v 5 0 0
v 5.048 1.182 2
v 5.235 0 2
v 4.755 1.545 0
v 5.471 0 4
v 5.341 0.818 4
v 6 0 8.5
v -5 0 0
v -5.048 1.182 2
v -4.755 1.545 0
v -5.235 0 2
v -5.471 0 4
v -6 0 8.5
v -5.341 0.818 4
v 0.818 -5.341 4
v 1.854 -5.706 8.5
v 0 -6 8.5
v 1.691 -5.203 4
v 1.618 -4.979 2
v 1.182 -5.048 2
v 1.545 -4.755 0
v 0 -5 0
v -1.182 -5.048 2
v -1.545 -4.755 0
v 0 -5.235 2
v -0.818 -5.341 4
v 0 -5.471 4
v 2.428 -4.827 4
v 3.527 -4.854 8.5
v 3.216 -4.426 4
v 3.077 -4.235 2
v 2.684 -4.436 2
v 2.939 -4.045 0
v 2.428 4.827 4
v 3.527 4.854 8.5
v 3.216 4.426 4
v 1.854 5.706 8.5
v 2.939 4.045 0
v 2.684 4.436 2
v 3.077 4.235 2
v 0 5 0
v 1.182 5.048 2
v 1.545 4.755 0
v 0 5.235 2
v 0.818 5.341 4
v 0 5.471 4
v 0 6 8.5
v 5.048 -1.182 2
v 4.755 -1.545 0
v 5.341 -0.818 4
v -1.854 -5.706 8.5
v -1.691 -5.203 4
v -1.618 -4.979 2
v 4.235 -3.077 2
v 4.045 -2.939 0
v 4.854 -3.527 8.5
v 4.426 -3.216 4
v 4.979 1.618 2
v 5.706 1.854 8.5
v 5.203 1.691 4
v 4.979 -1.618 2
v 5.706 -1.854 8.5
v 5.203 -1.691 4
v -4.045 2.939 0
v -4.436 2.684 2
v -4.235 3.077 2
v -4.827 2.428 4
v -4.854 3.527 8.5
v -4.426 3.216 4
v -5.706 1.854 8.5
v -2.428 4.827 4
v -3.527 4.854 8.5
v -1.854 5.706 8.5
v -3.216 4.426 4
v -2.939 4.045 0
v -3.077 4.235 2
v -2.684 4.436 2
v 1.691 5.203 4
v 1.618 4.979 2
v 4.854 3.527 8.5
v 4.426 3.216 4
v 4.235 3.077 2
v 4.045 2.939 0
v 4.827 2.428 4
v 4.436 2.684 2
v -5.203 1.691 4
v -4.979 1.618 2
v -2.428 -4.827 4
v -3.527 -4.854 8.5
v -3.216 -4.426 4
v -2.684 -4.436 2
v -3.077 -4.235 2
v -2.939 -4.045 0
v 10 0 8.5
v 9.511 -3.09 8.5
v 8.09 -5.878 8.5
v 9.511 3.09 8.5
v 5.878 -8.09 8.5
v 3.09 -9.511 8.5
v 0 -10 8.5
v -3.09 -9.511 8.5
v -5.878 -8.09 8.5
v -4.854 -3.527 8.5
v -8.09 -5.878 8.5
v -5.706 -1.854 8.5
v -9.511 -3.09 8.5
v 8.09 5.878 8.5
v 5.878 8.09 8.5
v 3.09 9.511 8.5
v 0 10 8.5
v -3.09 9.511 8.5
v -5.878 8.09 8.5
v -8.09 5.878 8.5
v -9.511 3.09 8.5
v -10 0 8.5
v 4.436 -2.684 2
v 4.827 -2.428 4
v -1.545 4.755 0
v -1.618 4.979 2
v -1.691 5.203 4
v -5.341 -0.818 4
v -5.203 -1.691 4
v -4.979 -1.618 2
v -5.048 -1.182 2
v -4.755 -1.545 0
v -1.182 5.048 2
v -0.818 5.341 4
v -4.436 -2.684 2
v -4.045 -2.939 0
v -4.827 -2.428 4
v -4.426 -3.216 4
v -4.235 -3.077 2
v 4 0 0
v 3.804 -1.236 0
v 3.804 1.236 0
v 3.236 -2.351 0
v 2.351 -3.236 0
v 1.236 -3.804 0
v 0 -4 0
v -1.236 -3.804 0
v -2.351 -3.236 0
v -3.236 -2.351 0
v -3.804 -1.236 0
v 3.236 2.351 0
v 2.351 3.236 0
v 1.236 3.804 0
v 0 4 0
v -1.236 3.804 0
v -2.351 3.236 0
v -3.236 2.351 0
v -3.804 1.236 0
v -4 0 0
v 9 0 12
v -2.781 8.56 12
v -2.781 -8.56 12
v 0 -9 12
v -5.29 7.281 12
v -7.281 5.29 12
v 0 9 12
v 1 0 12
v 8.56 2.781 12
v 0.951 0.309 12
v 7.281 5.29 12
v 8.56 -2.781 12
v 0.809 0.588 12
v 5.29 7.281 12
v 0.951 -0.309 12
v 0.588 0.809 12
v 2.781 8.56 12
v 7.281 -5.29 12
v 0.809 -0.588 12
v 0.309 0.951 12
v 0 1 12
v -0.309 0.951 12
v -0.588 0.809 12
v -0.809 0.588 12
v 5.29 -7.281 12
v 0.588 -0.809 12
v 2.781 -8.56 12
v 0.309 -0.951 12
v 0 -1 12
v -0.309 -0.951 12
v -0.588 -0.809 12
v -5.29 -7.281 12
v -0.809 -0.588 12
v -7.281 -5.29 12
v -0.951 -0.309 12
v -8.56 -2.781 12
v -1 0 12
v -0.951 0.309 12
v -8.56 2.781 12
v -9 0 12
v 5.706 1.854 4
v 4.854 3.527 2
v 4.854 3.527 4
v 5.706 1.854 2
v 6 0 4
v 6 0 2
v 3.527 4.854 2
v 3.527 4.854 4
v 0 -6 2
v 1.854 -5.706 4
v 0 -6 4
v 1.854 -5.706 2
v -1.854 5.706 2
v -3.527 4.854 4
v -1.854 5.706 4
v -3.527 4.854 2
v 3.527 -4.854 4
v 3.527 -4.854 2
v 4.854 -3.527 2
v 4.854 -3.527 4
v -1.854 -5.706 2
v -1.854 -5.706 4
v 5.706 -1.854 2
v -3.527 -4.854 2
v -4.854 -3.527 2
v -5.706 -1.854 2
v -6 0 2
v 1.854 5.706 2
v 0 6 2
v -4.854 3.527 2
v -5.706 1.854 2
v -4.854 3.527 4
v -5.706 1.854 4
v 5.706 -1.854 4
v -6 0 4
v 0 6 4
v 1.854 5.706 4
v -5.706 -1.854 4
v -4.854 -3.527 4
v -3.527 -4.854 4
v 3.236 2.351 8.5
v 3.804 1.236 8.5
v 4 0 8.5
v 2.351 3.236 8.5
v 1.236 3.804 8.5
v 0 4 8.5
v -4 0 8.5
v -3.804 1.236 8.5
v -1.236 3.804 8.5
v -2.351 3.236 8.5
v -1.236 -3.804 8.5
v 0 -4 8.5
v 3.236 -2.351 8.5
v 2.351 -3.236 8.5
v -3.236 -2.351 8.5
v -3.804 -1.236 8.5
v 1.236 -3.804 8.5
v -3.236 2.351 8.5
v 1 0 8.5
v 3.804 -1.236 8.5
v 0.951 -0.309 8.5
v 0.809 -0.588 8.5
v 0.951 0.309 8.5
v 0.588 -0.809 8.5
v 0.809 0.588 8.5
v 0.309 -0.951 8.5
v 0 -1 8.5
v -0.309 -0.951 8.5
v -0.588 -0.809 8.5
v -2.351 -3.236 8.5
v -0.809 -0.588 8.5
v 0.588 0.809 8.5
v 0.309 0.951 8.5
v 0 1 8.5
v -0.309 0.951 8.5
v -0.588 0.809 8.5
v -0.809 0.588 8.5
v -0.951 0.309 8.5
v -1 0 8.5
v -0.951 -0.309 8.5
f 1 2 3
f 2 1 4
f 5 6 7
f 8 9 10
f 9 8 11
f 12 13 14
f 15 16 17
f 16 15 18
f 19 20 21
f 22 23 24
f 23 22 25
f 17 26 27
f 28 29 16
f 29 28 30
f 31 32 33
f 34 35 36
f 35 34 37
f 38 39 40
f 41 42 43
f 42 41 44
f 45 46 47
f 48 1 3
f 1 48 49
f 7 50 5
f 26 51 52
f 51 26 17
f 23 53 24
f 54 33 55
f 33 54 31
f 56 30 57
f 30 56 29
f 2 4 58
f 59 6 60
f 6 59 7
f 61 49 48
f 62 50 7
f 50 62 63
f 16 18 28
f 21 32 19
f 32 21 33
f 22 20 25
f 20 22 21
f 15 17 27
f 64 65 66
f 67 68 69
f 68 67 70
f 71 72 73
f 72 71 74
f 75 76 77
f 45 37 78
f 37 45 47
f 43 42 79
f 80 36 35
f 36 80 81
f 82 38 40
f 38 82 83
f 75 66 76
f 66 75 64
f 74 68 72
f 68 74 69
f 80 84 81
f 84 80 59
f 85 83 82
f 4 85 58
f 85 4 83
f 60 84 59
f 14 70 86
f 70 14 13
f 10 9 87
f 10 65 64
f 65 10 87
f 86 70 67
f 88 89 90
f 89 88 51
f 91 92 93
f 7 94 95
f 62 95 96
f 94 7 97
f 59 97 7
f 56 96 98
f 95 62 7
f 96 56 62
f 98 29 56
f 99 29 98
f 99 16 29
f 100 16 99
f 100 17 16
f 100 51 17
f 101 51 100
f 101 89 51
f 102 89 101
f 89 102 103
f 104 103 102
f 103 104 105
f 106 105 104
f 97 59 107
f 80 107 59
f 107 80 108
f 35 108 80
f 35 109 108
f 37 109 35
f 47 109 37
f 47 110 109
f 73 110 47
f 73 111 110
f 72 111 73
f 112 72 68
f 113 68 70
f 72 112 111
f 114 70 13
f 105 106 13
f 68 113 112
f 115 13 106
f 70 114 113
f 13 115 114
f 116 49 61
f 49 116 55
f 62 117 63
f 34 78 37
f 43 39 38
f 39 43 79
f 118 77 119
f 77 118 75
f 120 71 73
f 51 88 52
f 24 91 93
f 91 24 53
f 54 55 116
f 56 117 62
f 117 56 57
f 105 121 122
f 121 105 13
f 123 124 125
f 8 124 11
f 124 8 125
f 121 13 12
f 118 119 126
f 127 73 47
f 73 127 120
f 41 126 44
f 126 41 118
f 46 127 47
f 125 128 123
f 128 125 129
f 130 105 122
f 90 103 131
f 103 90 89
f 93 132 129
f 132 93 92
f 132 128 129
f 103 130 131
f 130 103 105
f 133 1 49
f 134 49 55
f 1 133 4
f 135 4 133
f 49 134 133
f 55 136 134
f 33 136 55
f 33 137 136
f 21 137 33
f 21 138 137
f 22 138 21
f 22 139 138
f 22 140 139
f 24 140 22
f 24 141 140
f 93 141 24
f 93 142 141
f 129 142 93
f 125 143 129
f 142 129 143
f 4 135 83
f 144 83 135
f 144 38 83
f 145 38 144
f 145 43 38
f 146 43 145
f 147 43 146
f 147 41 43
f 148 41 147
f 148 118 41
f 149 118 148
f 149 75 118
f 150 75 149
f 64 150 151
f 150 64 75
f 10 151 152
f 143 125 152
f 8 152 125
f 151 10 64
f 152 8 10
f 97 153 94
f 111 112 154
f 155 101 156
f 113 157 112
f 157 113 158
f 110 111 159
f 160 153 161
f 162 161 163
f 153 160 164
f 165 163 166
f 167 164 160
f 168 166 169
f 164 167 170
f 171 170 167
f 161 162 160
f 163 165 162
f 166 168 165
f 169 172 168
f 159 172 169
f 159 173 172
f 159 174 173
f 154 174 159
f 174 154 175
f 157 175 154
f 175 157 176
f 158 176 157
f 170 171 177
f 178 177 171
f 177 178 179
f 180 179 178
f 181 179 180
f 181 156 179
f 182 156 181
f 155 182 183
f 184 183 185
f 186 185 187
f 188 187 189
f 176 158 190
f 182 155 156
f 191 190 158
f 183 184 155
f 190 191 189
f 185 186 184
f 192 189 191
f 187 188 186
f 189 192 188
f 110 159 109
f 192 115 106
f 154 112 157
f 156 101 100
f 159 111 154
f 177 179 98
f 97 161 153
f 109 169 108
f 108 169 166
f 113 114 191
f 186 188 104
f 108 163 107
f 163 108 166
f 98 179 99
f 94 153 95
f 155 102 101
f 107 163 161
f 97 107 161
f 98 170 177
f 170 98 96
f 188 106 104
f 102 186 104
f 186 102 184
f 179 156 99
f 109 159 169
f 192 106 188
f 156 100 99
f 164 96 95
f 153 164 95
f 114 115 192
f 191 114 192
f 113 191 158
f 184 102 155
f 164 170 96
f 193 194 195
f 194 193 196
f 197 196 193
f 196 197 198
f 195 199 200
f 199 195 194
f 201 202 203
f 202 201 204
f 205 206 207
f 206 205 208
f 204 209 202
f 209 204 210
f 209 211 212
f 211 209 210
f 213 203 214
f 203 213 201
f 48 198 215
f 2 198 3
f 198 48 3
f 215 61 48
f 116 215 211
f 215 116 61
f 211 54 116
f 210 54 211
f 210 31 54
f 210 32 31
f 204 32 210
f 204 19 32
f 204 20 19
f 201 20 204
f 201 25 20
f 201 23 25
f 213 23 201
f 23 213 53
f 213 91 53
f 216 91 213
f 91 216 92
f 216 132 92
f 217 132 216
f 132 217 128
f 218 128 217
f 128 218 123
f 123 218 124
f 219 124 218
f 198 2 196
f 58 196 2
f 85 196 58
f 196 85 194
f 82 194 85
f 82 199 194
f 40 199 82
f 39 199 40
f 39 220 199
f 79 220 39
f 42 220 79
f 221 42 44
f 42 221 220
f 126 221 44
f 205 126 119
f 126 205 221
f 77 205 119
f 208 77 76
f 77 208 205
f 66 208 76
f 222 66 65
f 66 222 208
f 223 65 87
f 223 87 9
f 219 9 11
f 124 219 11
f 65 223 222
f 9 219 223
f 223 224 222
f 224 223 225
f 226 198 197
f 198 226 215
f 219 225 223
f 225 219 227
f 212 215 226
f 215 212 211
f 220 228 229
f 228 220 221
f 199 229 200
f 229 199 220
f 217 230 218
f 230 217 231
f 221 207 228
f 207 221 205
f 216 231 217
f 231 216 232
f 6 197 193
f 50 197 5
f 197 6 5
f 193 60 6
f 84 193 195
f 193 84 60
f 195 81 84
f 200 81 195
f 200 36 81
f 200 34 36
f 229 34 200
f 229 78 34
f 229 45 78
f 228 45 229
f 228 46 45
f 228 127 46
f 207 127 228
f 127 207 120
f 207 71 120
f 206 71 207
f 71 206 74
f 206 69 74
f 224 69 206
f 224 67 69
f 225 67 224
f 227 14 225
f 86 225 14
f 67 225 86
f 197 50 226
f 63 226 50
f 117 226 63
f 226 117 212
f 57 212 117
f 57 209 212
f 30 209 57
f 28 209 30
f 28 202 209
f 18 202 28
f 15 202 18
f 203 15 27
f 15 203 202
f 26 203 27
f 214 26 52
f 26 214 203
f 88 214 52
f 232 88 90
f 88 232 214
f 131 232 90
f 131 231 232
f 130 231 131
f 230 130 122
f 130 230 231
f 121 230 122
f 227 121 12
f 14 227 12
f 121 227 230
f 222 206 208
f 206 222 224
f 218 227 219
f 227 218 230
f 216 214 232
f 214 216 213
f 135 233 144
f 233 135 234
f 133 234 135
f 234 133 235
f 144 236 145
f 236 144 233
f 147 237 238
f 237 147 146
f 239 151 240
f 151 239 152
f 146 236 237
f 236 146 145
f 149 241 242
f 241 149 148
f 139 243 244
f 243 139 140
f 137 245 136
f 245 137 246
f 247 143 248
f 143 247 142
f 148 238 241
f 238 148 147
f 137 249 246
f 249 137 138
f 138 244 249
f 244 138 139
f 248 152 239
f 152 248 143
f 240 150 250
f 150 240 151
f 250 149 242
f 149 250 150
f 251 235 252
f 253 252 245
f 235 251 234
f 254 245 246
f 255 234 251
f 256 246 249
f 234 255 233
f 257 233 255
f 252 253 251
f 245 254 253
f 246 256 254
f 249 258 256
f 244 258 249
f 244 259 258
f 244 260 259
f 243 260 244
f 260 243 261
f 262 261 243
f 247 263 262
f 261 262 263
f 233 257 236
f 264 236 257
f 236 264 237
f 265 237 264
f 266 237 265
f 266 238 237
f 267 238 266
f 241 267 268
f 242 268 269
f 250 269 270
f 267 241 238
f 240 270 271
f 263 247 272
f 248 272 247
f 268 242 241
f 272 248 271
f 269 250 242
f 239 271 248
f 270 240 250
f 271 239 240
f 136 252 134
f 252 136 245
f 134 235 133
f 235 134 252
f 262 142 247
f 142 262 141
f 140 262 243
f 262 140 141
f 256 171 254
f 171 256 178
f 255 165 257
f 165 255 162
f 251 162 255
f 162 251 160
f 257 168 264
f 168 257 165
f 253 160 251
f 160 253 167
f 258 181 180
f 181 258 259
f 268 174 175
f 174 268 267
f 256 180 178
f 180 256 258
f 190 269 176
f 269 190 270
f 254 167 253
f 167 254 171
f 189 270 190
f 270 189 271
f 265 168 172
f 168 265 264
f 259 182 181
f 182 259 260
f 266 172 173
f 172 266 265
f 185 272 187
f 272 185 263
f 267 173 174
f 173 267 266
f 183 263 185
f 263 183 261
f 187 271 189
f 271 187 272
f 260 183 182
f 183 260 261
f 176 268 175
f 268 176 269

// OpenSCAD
// openNSP_project, end caps section version 1.0
// Zexuan Qiao, 2024
// under GPL license ver3

capLOA = 12; //.1
chamber = 8.5; //.1
bore = 8; //.1
mainDiameter = 10; //.1
pin = 2; //.1
bell = 20; //.1
endOffset = 2; //.1
decoration = 2; //.1
decoPos = 2; //.1

decoDiameter = mainDiameter + 2;
/* [Utilities] */
// Segments, the higher the value, the smoother the surface would be.
$fn = 20;

difference(){
union(){
cylinder(h = chamber, d1 = mainDiameter, d2 = mainDiameter + endOffset);
translate([0,0,chamber]) cylinder(h = capLOA - chamber, d1 = bell, d2 = bell - endOffset);
translate([0,0,decoPos]) cylinder(h = decoration, d = decoDiameter);
}
cylinder(h = chamber, d = bore);
cylinder(h = capLOA, d = pin);
}
